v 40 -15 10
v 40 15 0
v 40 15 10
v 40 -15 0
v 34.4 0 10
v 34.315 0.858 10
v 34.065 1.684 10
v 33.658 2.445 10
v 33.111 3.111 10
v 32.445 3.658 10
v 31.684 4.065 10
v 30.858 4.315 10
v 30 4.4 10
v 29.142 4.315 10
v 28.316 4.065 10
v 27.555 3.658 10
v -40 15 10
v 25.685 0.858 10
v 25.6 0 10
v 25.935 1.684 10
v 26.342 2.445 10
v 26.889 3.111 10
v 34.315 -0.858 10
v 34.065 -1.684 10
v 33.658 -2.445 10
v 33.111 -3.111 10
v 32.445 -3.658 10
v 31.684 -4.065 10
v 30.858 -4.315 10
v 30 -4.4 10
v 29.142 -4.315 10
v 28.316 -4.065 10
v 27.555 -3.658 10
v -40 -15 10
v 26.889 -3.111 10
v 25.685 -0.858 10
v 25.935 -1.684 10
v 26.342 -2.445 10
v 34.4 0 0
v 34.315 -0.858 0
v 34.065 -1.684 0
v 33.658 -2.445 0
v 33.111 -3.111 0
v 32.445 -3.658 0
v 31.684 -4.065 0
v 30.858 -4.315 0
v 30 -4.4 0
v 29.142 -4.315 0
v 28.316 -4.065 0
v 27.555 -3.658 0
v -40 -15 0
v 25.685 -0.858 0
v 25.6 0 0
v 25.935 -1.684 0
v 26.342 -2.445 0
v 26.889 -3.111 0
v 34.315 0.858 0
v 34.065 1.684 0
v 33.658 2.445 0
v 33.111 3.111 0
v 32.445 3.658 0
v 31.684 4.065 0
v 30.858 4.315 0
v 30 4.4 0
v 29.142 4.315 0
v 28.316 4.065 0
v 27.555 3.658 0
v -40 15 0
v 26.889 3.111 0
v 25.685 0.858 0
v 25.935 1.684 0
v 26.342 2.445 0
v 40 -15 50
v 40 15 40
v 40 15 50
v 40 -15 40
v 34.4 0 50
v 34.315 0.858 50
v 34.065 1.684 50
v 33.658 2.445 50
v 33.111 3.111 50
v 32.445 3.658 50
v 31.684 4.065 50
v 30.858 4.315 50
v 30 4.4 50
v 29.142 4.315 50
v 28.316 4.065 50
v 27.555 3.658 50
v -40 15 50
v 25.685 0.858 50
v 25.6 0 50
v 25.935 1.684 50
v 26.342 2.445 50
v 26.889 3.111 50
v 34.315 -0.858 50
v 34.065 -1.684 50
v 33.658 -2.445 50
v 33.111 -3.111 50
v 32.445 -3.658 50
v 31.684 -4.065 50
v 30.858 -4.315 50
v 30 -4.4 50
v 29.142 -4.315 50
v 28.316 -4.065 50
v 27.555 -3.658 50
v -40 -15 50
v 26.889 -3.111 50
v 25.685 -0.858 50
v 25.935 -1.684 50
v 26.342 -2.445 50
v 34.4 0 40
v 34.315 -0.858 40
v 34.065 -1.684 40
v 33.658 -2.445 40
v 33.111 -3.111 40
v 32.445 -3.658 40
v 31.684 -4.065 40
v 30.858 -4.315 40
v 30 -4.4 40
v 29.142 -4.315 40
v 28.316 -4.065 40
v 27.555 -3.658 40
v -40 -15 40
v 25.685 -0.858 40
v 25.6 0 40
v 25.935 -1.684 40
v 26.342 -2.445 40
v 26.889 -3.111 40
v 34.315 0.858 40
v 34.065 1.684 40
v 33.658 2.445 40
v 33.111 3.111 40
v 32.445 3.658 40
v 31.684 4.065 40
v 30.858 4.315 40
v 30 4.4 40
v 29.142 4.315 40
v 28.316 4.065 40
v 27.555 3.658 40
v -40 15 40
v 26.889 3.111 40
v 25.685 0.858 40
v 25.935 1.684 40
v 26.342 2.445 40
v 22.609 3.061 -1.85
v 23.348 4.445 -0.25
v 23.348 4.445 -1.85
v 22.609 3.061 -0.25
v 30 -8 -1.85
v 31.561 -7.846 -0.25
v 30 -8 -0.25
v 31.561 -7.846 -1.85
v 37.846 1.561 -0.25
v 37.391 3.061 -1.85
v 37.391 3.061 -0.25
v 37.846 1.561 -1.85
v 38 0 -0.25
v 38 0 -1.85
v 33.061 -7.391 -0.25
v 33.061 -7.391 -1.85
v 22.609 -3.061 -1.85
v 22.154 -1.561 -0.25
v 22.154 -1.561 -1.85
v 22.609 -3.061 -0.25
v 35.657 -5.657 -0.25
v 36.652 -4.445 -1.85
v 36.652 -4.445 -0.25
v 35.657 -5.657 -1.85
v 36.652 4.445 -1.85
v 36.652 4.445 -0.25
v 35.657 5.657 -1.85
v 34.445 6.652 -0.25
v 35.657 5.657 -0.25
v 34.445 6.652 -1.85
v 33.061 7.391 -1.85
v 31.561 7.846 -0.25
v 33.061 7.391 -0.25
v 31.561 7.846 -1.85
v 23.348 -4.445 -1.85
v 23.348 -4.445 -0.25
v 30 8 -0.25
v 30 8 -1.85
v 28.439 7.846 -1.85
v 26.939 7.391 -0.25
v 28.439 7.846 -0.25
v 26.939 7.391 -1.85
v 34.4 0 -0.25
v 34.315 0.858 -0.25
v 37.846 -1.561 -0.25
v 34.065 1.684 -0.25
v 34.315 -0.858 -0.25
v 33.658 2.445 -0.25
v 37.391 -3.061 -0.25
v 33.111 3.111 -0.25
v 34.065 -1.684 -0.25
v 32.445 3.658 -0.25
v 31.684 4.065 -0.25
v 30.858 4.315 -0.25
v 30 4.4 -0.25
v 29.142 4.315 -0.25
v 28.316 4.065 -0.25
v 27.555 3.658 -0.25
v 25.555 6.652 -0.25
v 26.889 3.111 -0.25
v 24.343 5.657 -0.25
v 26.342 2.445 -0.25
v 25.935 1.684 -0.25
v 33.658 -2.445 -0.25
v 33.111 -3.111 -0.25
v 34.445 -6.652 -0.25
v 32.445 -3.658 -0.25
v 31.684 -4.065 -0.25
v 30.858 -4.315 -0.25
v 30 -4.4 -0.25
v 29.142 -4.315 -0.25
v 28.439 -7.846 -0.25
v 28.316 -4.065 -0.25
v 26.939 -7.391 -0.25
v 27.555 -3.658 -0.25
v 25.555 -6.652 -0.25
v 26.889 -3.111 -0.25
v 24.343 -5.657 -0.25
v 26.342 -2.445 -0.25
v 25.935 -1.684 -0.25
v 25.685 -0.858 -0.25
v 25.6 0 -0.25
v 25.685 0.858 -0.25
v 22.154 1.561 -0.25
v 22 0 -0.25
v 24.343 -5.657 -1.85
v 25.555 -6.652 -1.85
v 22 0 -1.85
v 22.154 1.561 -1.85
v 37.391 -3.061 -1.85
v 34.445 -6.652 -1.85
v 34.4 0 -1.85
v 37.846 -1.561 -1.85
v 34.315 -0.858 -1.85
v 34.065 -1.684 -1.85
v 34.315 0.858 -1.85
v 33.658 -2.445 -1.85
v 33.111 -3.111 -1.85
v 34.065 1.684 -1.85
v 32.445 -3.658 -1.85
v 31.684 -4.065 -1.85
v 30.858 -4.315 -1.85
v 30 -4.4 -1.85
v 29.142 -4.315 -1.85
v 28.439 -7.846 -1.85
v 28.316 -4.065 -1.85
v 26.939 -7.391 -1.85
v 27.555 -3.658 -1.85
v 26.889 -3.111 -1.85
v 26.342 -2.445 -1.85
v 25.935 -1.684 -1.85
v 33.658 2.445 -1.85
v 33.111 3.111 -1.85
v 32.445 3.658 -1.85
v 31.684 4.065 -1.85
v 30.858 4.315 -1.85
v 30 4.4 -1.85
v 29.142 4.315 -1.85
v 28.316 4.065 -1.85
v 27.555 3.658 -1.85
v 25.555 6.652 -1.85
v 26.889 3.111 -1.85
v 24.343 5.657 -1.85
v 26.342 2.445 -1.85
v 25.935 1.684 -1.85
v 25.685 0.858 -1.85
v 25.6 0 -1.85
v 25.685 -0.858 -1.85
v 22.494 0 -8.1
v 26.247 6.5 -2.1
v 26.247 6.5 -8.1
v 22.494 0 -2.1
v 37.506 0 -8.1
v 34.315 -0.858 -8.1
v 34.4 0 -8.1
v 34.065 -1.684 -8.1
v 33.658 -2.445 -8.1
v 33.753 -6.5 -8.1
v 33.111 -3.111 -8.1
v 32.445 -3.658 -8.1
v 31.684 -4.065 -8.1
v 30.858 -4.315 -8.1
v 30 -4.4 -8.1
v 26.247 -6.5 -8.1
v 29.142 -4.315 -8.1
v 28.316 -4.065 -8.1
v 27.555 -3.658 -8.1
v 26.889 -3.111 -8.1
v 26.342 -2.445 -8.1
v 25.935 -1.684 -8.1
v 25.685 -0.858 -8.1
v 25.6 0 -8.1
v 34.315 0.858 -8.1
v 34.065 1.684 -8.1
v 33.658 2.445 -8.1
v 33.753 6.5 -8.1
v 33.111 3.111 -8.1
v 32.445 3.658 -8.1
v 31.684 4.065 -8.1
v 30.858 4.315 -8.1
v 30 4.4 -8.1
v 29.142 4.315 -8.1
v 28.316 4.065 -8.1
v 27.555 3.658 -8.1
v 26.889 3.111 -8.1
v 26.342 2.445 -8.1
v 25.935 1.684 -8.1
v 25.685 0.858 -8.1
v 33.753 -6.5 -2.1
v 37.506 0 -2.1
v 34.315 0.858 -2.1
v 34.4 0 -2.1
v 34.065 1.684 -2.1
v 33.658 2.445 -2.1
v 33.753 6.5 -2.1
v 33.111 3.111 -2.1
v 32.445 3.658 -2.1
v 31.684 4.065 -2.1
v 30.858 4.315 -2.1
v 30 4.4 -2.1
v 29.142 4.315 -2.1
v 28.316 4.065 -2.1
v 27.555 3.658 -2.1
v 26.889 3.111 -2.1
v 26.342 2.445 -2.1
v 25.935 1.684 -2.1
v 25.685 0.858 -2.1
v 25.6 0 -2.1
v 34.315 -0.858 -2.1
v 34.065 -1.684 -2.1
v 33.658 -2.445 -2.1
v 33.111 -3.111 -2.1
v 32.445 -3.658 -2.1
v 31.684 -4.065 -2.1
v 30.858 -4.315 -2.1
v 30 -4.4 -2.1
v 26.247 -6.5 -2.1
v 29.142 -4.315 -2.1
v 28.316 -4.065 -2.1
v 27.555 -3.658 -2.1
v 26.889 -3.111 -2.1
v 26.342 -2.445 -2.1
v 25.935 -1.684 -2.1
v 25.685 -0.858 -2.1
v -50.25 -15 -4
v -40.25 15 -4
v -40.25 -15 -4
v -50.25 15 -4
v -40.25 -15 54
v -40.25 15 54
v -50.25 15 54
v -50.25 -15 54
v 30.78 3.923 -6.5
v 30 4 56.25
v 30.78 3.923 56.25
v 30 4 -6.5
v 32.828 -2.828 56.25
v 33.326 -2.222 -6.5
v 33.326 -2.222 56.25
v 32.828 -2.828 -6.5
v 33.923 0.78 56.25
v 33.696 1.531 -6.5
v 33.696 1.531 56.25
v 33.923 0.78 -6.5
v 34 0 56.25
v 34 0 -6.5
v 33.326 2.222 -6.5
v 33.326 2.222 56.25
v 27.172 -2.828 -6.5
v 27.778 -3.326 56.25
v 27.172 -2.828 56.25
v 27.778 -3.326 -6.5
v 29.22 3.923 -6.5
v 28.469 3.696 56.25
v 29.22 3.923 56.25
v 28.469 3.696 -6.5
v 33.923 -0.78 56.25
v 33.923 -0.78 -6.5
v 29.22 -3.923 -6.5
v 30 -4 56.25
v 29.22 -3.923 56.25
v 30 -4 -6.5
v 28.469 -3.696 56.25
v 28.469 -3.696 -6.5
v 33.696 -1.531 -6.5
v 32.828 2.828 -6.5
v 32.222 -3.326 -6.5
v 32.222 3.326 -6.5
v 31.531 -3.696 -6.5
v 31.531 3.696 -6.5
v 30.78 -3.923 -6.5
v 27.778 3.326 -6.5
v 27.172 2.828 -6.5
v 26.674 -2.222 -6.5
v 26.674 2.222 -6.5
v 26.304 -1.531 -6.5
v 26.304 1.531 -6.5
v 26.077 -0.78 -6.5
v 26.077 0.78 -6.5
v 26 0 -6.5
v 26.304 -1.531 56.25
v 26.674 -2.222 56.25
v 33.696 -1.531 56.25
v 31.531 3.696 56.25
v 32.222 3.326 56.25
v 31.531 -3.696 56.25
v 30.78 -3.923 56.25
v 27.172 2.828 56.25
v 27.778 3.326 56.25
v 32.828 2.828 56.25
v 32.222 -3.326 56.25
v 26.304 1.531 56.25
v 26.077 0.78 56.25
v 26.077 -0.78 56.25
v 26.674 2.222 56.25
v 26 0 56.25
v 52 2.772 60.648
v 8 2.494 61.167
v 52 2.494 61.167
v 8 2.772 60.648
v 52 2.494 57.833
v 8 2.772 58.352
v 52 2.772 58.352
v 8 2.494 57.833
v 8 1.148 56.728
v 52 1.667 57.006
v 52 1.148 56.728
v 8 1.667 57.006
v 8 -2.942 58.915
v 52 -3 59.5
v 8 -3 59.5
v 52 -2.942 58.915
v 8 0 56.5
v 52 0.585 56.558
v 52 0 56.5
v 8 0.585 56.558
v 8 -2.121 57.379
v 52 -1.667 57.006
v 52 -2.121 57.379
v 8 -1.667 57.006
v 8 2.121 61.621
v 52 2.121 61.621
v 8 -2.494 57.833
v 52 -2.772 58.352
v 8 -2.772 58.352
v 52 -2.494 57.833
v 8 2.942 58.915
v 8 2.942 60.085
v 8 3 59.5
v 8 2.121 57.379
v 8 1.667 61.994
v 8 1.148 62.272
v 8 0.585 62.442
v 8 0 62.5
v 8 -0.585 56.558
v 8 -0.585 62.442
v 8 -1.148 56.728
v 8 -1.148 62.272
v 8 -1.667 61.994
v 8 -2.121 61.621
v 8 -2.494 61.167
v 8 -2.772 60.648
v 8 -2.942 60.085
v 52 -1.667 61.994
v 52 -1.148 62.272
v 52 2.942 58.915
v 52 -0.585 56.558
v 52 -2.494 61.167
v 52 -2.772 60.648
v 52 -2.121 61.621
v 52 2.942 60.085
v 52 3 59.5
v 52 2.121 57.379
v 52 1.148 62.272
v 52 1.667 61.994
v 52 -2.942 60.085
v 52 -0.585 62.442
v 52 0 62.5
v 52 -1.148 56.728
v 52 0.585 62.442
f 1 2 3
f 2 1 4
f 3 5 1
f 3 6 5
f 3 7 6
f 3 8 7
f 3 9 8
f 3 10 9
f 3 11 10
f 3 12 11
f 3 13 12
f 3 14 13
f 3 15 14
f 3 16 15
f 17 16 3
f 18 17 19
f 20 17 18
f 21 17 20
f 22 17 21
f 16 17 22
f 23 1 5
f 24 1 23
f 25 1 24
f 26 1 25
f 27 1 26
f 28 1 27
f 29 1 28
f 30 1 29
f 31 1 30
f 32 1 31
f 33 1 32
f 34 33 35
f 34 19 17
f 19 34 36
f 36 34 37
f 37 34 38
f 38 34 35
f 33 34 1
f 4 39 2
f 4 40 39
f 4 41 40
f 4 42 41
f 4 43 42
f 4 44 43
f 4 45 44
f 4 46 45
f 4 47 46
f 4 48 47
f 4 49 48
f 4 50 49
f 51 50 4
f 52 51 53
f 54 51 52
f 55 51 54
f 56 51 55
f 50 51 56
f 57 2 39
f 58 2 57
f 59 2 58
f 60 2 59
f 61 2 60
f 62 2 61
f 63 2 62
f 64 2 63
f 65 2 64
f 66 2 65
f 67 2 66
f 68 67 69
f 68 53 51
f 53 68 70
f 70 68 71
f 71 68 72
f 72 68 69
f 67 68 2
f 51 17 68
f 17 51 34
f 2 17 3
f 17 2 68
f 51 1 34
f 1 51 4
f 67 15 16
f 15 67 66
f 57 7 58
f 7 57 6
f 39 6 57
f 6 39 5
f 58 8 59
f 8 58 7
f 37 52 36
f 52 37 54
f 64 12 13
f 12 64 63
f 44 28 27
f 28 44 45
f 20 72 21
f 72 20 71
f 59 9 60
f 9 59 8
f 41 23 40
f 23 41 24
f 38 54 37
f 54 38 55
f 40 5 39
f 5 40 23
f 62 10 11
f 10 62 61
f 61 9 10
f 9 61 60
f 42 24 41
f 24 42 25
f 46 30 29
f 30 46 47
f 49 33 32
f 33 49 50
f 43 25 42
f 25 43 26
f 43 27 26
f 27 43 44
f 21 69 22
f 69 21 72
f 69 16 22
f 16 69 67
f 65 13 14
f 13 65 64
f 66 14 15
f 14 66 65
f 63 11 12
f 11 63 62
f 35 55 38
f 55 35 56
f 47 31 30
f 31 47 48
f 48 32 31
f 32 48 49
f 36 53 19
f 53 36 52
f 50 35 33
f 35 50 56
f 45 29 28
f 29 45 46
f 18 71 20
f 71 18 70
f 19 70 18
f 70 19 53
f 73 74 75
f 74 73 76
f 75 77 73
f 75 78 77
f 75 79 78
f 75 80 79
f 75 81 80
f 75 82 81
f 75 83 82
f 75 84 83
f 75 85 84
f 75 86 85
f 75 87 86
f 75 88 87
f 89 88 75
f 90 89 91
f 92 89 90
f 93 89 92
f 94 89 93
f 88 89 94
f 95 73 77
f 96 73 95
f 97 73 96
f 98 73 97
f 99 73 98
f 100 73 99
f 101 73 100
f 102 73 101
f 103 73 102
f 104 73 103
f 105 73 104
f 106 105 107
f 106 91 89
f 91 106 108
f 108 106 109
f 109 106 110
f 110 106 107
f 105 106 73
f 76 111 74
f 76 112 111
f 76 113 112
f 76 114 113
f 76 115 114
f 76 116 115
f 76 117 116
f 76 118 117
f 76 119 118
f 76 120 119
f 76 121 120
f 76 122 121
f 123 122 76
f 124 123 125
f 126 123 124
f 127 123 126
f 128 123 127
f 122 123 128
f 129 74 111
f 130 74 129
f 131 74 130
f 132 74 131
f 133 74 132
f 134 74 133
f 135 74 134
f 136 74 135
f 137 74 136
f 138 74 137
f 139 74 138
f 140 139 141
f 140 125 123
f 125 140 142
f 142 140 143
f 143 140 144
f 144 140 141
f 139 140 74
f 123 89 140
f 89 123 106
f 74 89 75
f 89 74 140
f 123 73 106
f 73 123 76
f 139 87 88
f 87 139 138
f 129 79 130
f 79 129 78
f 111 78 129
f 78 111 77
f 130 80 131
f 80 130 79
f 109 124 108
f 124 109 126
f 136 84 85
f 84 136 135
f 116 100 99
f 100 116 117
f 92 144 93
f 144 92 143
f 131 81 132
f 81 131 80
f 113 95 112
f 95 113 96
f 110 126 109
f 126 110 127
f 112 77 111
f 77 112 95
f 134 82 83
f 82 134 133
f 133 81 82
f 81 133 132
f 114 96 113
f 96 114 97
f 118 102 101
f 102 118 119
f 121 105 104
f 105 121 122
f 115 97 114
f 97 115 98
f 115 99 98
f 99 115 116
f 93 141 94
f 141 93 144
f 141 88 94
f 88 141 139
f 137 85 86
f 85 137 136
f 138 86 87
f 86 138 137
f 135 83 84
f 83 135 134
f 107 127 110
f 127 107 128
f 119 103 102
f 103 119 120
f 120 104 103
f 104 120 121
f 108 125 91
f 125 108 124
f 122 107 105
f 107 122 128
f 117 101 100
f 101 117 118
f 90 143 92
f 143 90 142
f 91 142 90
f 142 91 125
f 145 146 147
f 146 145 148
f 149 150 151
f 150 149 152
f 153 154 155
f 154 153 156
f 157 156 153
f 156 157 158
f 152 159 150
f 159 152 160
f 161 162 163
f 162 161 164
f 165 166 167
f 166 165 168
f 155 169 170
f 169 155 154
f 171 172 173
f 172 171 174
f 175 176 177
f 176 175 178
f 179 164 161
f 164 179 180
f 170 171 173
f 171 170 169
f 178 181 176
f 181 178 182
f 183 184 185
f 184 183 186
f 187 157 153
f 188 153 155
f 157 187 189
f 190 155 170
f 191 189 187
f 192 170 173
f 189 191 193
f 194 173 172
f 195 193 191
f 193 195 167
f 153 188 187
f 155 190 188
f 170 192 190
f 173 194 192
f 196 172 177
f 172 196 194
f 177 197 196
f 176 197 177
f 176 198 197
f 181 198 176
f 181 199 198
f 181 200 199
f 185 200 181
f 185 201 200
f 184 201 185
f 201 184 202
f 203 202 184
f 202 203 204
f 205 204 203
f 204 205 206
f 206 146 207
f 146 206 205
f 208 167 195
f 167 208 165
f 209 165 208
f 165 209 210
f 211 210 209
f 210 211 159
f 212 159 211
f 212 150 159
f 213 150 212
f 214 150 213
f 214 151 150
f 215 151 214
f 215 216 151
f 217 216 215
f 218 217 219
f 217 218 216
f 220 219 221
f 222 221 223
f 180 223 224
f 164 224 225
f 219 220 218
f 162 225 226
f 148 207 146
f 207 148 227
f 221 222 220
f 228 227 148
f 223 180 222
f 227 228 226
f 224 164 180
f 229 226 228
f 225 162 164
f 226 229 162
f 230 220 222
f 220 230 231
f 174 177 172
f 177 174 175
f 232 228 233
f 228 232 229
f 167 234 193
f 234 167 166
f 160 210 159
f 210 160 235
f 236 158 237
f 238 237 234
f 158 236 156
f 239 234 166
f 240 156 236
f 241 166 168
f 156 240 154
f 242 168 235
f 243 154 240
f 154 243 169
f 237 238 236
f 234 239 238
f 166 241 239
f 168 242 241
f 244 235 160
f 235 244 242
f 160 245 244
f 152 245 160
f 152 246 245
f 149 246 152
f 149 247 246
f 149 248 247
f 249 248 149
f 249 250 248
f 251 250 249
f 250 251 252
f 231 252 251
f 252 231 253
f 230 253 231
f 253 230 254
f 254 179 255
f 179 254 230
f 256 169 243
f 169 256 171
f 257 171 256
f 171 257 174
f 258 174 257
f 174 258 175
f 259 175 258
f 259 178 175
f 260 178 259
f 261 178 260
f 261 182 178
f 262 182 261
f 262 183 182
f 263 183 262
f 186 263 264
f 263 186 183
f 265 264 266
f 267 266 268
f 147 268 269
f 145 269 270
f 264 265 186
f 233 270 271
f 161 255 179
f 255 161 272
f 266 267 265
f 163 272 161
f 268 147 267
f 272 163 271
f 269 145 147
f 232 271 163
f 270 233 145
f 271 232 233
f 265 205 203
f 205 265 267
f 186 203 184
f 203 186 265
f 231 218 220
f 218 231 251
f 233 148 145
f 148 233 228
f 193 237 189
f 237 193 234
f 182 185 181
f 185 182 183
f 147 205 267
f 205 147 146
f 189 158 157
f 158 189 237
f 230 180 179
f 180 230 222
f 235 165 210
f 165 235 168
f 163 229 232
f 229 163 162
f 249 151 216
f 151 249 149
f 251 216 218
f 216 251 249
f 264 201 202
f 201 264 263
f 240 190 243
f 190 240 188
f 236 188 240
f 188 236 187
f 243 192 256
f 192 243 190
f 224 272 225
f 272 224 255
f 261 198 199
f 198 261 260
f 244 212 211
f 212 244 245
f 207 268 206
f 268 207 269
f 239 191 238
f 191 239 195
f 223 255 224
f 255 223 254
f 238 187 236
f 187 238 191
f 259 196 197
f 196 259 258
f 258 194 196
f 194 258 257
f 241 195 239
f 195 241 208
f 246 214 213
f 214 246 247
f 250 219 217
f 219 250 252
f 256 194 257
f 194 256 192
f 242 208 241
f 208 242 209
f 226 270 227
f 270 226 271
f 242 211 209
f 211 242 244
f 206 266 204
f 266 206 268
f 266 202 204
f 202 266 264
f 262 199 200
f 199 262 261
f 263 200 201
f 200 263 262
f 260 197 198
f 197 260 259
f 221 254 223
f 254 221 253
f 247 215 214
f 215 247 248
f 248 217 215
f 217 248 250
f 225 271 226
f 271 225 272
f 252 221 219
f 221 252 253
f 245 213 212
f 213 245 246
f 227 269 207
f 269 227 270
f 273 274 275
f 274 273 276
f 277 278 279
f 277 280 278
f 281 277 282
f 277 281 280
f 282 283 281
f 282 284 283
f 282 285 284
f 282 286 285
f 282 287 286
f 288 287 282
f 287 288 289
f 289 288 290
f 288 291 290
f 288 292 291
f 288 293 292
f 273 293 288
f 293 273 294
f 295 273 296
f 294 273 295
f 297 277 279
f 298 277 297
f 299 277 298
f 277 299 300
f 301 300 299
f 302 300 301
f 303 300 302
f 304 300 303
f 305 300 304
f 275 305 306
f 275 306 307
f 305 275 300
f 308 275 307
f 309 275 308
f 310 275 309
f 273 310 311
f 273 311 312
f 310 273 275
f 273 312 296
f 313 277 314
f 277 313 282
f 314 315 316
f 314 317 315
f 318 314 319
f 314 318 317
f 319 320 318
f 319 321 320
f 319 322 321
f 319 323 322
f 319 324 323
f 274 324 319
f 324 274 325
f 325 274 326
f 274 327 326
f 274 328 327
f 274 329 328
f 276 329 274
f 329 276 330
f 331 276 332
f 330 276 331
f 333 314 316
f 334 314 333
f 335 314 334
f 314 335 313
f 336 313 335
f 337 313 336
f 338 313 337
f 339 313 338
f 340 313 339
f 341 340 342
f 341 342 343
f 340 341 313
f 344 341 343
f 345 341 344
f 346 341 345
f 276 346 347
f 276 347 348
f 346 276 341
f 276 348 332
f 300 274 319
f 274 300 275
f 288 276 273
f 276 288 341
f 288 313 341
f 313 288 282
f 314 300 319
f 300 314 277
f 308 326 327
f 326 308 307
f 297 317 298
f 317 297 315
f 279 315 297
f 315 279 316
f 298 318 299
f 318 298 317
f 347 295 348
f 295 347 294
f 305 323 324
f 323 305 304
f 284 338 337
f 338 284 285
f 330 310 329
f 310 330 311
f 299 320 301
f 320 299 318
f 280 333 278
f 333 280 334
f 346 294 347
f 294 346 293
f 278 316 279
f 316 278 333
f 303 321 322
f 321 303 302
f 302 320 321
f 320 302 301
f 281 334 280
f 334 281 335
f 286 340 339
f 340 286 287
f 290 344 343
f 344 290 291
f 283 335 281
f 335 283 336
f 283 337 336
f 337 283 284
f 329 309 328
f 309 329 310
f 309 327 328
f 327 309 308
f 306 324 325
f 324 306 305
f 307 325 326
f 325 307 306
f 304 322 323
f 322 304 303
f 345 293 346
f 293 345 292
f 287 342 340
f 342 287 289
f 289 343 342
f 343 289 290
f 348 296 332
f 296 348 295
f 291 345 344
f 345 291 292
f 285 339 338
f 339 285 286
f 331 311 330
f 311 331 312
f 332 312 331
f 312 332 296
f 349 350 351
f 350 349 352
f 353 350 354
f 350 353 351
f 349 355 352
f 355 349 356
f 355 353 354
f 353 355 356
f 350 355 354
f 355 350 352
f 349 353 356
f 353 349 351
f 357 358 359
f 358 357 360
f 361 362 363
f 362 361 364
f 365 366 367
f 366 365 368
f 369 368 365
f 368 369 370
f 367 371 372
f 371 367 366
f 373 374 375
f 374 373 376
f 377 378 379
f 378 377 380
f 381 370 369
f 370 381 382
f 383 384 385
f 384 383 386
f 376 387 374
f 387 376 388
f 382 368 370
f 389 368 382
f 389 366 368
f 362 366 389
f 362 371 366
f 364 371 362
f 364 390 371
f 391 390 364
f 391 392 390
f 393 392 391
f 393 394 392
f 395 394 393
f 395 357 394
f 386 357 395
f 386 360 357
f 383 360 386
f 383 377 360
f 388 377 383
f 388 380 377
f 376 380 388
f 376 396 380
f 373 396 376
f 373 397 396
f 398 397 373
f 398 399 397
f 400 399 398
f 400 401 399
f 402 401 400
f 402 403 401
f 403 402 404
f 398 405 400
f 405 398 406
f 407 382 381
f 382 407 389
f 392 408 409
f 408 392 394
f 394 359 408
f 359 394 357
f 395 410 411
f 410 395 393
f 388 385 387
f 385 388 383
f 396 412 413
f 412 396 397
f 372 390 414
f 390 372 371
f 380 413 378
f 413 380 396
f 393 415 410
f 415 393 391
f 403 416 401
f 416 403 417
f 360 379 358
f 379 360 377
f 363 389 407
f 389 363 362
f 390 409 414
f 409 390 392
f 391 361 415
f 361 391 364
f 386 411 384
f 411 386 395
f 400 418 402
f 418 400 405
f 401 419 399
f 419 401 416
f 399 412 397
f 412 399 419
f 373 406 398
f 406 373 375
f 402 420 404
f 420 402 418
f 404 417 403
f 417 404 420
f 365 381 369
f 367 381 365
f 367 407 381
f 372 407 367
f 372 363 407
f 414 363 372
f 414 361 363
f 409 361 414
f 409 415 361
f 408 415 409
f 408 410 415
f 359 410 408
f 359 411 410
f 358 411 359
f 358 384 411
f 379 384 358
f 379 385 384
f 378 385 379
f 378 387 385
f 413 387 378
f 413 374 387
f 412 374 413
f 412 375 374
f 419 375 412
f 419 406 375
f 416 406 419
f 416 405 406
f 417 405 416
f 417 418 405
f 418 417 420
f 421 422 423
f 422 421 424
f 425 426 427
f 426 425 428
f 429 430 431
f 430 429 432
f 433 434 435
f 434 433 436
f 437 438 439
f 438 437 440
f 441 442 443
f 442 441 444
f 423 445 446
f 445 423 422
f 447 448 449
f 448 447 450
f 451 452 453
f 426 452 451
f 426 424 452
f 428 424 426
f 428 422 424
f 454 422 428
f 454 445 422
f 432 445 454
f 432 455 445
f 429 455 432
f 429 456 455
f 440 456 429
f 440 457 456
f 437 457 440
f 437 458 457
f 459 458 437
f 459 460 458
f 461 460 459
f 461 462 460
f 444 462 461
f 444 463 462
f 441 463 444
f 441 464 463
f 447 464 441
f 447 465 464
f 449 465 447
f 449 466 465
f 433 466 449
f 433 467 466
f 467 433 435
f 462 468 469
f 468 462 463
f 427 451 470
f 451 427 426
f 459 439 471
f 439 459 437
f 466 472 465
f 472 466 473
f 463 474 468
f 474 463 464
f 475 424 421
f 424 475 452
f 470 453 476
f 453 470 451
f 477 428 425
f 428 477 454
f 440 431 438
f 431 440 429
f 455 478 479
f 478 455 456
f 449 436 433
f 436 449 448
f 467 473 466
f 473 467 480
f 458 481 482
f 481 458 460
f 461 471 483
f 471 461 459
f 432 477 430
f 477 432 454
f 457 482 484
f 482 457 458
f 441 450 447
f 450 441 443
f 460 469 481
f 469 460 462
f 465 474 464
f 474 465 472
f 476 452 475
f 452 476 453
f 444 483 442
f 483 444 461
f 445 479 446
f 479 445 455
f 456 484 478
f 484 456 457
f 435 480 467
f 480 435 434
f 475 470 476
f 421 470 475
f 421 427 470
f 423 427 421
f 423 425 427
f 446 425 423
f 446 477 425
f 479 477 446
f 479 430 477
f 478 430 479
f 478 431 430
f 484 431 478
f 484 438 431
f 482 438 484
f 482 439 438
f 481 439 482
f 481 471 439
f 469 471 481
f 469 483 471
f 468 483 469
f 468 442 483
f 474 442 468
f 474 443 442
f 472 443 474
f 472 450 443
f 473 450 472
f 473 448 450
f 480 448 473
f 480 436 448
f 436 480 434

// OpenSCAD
$fn = 32;

// ------------------------------------------------------------------------
// C clamp: throat 40 mm, screw d8
// Every part is its own module, assembly() places every instance.
// ------------------------------------------------------------------------

// --- part 1 ---
module clamp_arm() {
  difference() {
    translate([-40, -15, 0]) cube([80, 30, 10]);
    translate([30, 0, -1]) cylinder(h = 12, d = 8.8);
  }
}

// --- part 2 ---
module clamp_spine() {
  difference() {
    translate([-29, -15, 0]) cube([58, 30, 10]);
  }
}

// --- part 3 ---
module clamp_screw() {
  translate([0, 0, -31.375]) cylinder(h = 62.75, d = 8);
}

// --- part 4 ---
module clamp_washer() {
  difference() {
      translate([0, 0, 0]) cylinder(h = 1.6, d = 16);
      translate([0, 0, -1]) cylinder(h = 3.6, d = 8.8);
    }
}

// --- part 5 ---
module clamp_nut() {
  difference() {
    linear_extrude(height = 6) polygon(points = [[7.506, 0], [3.753, 6.5], [-3.753, 6.5], [-7.506, 0], [-3.753, -6.5], [3.753, -6.5]]);
    translate([0, 0, -1]) cylinder(h = 8, d = 8.8);
  }
}

// --- part 6 ---
module tommy_bar() {
  translate([0, 0, -22]) cylinder(h = 44, d = 6);
}

// --- assembly ---
module assembly() {
  color([0.80, 0.24, 0.20]) translate([0, 0, 0]) rotate([0, 0, 0]) clamp_arm();
  color([0.20, 0.45, 0.75]) translate([0, 0, 40]) rotate([0, 0, 0]) clamp_arm();
  color([0.25, 0.62, 0.32]) translate([-50.25, 0, 25]) rotate([0, 90, 0]) clamp_spine();
  color([0.92, 0.70, 0.18]) translate([30, 0, 24.875]) rotate([0, 0, 0]) clamp_screw();
  color([0.58, 0.35, 0.70]) translate([30, 0, -1.85]) rotate([0, 0, 0]) clamp_washer();
  color([0.16, 0.66, 0.66]) translate([30, 0, -8.1]) rotate([0, 0, 0]) clamp_nut();
  color([0.85, 0.48, 0.18]) translate([30, 0, 59.5]) rotate([0, 90, 0]) tommy_bar();
}

assembly();
